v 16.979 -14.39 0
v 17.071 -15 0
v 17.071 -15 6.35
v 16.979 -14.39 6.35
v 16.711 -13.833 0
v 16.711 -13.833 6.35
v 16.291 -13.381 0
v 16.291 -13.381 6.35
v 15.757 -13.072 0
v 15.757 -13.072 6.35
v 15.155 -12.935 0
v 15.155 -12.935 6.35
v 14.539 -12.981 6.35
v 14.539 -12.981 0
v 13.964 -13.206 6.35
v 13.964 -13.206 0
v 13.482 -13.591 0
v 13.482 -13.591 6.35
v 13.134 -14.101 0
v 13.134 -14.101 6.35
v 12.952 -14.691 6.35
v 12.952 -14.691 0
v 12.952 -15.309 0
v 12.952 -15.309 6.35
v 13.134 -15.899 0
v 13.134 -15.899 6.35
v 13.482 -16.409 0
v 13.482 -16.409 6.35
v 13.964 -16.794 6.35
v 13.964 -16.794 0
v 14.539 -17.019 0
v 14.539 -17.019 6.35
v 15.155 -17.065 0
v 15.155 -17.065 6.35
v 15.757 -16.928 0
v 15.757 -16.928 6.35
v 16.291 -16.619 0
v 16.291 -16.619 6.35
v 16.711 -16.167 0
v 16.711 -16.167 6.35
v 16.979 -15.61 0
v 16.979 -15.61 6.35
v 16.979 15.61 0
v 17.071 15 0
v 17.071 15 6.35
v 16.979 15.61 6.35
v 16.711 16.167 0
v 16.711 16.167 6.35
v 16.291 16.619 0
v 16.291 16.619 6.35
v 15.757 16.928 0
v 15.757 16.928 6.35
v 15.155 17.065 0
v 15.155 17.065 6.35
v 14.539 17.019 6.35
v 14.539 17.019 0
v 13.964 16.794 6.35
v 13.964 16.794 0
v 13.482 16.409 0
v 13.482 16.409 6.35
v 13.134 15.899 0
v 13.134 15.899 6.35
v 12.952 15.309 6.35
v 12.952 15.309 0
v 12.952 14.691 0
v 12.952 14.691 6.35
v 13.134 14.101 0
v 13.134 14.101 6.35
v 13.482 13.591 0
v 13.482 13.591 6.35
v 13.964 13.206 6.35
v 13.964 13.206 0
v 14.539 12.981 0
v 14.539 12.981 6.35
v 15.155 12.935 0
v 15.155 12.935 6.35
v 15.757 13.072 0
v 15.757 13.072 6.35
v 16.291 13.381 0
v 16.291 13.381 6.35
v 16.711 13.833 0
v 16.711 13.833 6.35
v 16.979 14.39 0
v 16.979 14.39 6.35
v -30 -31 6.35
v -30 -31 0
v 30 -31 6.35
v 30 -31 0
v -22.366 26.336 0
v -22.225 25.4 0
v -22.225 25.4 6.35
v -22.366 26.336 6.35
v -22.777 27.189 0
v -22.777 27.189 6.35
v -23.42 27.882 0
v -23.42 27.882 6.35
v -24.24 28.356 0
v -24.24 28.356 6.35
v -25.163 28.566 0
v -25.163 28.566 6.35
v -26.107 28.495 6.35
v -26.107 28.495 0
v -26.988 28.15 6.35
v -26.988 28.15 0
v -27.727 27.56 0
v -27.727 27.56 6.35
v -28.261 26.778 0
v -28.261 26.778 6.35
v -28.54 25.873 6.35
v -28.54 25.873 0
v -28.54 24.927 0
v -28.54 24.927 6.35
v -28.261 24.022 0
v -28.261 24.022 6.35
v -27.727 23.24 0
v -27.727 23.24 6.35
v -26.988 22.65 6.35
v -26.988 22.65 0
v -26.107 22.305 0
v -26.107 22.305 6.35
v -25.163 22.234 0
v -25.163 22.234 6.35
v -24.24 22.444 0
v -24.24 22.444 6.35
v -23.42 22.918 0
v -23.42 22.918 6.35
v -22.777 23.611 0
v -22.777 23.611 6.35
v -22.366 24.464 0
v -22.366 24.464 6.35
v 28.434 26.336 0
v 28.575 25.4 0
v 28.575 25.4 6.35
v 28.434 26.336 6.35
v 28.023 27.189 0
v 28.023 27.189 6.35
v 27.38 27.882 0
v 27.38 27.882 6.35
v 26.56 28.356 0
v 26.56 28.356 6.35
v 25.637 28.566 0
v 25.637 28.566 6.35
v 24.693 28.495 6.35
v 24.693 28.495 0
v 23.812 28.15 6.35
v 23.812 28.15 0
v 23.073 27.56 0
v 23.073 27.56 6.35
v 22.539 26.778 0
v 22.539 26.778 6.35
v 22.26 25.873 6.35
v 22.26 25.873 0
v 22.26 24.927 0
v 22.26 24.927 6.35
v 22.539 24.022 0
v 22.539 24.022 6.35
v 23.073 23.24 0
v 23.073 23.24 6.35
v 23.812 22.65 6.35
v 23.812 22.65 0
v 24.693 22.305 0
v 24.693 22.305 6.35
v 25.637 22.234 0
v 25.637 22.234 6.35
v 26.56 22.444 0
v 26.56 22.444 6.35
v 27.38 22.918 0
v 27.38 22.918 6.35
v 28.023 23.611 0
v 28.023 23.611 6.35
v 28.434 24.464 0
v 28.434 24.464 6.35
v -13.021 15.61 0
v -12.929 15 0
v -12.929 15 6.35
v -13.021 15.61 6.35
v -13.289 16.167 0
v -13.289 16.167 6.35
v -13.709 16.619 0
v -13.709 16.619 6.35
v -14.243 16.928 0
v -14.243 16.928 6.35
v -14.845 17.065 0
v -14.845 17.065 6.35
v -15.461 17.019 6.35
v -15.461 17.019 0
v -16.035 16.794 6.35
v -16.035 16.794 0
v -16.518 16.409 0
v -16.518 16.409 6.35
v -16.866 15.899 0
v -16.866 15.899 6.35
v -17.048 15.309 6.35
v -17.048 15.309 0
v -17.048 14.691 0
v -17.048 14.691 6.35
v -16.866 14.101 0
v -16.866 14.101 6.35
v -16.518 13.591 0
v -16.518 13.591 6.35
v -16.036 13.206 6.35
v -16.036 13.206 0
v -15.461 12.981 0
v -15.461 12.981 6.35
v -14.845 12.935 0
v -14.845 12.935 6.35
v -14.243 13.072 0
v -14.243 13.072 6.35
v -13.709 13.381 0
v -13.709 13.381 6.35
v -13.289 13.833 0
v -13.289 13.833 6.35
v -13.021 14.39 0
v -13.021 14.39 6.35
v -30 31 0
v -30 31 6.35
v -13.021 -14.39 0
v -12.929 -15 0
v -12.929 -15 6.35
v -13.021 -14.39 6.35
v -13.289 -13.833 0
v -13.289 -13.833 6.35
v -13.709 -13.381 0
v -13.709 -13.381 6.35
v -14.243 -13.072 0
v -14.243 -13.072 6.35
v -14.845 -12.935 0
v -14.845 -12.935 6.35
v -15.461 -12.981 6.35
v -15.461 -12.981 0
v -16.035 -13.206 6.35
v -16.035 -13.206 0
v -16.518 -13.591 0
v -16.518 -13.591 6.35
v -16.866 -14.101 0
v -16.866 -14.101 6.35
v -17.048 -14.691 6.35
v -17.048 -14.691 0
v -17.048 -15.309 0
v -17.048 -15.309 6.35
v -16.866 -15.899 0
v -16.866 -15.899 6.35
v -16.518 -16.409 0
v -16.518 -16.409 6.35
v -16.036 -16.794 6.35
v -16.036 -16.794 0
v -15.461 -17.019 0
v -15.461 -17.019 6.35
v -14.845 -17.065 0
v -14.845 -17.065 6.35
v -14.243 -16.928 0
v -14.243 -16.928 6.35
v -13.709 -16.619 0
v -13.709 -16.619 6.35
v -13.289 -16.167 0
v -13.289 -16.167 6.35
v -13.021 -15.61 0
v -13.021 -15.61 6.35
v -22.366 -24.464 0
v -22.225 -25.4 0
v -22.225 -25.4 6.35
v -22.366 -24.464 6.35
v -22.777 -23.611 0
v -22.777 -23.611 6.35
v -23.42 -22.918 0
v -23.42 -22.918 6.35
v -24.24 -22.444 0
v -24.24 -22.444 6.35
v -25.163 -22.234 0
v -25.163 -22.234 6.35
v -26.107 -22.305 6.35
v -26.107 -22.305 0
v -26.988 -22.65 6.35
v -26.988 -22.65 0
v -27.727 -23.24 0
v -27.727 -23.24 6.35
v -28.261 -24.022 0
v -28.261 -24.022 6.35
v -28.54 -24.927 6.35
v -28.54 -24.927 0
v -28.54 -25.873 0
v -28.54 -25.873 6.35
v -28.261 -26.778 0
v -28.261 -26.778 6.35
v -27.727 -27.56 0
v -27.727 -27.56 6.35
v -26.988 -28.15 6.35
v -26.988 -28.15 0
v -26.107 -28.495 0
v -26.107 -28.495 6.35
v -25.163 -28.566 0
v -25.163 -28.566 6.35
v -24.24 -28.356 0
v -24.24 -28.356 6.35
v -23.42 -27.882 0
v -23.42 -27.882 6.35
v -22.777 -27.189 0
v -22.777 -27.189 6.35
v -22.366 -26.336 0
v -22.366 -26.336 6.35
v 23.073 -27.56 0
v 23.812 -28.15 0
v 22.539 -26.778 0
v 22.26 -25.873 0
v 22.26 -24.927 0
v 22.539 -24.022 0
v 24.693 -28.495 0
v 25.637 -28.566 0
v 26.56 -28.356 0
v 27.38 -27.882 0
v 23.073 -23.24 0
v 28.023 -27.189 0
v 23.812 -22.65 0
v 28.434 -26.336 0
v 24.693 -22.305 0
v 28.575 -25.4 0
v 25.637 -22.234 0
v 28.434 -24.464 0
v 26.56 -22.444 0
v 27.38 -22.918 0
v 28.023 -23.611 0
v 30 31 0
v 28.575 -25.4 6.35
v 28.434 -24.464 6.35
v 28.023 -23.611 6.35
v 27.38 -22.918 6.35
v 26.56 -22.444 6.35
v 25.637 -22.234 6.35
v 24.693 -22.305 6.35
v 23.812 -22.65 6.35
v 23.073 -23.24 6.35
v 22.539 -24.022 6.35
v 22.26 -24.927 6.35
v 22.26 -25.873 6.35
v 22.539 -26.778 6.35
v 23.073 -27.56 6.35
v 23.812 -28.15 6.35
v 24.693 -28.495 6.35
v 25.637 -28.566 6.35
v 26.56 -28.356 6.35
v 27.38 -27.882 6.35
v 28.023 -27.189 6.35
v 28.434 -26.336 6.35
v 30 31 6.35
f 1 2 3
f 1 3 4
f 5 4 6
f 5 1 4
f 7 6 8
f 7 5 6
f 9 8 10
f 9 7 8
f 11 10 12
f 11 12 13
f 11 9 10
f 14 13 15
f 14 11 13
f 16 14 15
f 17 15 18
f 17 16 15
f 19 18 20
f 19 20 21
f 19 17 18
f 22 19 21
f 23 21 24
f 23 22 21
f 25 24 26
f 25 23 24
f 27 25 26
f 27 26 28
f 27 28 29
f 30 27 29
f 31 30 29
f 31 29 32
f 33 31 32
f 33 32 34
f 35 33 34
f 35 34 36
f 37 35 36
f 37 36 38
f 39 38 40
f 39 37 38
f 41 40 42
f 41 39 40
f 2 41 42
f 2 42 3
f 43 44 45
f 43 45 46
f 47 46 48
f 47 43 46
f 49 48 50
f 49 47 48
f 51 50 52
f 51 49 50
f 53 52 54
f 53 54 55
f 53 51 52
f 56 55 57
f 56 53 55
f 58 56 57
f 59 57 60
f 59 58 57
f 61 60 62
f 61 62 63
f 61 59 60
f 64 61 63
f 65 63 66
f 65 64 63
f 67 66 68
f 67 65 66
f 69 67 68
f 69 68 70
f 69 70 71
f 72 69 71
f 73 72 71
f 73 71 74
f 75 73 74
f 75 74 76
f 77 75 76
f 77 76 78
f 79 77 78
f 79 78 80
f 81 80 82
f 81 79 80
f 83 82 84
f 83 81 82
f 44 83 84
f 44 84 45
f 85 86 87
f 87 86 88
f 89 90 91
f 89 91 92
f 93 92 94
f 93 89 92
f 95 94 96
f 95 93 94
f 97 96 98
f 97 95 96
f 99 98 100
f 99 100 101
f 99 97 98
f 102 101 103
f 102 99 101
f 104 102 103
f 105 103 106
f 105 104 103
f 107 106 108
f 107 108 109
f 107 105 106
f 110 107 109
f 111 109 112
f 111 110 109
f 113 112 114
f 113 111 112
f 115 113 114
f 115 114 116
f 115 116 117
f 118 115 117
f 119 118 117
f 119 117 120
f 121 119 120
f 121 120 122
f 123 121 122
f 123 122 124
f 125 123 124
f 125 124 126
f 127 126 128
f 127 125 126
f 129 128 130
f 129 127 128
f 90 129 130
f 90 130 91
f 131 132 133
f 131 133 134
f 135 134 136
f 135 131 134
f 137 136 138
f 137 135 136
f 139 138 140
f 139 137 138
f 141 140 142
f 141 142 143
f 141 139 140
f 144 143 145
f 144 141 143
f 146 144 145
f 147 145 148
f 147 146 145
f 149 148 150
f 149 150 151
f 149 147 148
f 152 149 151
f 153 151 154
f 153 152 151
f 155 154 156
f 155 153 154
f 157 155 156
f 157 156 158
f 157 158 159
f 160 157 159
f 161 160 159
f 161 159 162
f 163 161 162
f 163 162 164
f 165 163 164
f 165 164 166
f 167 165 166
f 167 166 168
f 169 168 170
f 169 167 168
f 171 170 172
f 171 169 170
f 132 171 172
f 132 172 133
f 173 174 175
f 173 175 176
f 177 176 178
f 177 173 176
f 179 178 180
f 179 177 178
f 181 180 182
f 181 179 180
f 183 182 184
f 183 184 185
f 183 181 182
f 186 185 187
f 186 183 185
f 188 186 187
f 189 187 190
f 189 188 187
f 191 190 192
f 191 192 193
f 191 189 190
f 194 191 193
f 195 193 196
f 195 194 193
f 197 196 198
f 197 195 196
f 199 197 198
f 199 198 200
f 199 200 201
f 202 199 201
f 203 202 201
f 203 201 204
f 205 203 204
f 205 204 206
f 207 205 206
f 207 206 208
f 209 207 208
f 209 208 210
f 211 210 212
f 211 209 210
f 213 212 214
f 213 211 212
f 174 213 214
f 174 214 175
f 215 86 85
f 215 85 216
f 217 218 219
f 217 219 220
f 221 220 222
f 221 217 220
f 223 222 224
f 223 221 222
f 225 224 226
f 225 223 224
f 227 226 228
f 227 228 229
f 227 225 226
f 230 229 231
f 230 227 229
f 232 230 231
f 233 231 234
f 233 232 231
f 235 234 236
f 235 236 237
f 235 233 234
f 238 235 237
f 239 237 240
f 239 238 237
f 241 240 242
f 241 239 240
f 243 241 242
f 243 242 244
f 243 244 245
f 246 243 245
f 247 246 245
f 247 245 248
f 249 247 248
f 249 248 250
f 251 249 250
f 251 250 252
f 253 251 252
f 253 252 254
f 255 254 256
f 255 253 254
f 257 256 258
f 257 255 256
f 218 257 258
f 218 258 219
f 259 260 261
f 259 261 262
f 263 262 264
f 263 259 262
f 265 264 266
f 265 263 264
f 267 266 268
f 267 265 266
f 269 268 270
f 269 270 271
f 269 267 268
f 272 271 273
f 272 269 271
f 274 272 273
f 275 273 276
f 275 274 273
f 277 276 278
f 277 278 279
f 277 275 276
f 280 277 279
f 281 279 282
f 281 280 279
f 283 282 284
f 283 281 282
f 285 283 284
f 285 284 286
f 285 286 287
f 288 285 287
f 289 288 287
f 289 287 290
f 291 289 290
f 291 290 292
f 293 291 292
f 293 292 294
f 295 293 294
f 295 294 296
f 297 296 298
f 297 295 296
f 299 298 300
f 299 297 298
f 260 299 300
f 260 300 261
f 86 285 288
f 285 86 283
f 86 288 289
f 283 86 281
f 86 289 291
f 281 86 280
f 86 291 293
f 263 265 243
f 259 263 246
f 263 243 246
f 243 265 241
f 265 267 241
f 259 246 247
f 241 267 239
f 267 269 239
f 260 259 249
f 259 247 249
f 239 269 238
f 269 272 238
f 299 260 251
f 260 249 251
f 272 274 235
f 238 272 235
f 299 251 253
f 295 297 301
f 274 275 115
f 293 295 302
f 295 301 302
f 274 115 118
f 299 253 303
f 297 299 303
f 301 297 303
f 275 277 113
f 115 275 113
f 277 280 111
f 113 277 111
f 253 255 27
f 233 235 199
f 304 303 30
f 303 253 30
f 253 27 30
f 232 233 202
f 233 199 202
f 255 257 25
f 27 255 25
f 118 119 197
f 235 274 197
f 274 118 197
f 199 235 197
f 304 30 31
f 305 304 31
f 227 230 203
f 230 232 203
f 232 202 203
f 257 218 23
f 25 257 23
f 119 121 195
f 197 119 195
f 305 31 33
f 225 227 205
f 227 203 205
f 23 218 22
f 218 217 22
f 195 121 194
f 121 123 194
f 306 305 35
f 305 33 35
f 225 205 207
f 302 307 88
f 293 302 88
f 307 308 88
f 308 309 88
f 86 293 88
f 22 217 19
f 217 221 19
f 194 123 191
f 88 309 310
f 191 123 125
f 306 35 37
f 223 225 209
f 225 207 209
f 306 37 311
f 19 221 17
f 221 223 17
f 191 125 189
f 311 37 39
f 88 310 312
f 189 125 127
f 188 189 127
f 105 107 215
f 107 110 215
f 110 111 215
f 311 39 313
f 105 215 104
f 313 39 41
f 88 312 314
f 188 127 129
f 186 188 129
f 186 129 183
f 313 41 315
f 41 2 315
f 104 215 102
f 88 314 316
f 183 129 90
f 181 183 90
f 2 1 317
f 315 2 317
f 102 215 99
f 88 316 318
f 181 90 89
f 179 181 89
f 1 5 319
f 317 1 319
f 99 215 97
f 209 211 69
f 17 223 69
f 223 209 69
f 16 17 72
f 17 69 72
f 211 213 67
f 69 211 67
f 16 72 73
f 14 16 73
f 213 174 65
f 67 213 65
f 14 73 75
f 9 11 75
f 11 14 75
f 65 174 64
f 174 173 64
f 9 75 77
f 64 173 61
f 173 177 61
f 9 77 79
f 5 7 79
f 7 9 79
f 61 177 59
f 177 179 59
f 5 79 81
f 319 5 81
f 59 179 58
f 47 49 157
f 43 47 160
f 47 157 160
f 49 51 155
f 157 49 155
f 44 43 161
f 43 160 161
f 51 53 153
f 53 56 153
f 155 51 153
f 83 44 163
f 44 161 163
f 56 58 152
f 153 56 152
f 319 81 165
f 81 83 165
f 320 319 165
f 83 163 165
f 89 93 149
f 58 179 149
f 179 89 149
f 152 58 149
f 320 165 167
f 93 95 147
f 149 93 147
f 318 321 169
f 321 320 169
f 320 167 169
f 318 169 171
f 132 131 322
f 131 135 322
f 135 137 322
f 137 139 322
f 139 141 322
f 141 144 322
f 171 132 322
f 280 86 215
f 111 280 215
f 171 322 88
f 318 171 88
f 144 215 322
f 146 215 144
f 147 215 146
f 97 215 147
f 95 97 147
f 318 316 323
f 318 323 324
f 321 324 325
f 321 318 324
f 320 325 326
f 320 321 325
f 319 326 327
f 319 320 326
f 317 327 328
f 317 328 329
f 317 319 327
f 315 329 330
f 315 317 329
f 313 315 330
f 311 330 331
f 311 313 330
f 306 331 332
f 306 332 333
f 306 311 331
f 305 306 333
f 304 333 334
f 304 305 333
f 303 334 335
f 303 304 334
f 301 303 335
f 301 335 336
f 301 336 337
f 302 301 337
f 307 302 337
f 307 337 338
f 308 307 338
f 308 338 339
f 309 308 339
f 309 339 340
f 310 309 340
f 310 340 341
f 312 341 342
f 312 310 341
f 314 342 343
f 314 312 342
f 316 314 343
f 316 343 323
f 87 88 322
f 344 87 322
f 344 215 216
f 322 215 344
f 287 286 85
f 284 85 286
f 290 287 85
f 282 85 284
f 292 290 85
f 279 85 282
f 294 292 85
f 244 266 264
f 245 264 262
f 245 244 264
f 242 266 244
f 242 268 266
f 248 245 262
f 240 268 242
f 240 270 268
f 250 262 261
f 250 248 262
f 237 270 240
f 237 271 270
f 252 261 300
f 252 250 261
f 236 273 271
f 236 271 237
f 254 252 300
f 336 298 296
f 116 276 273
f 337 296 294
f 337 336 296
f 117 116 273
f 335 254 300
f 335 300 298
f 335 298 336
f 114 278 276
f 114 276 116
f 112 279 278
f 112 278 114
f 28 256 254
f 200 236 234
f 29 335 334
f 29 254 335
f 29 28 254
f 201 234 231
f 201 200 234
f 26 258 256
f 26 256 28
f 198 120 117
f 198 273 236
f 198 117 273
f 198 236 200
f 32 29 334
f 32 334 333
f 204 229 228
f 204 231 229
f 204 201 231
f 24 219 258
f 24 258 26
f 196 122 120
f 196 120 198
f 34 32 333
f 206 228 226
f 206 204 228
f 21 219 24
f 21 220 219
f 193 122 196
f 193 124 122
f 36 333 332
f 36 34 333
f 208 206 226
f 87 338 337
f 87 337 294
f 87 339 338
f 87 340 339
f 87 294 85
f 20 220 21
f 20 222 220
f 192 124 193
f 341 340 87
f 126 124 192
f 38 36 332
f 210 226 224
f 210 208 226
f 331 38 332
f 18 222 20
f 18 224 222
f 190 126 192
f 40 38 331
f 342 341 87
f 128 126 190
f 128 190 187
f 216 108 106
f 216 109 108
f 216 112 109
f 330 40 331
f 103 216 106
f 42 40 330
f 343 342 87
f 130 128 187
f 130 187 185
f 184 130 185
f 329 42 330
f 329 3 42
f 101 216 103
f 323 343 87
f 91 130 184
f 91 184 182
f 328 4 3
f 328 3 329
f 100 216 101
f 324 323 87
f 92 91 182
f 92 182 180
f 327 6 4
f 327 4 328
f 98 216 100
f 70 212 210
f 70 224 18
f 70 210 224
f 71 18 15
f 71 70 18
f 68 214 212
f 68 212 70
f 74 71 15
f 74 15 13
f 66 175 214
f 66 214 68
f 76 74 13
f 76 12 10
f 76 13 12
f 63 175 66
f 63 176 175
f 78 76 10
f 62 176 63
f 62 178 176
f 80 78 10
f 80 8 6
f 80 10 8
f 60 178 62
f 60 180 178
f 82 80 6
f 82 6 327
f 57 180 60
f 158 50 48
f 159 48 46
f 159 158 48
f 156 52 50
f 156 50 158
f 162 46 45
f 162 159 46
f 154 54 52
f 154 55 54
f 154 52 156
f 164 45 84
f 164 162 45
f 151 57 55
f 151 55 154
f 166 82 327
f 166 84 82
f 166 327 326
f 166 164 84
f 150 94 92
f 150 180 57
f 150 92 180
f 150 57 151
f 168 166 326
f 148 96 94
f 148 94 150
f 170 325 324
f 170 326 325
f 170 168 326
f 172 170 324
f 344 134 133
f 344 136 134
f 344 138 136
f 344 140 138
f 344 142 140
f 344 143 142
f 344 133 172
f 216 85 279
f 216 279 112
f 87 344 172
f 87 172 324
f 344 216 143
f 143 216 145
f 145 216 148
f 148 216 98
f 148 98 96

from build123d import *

# Parameters (mm, degrees)
SKETCH1_W           = 60
SKETCH1_H           = 62
SKETCH1_R           = 3.175
SKETCH1_R_2         = 2.071
BOSS_EXTRUDE1_DEPTH = 6.35


with BuildPart() as part:
    # Sketch1 → Boss-Extrude1 (new body)
    with BuildSketch(Plane.XY):
        Rectangle(SKETCH1_W, SKETCH1_H)
        with Locations((25.4, 25.4)):
            Circle(SKETCH1_R, mode=Mode.SUBTRACT)
        with Locations((-25.4, 25.4)):
            Circle(SKETCH1_R, mode=Mode.SUBTRACT)
        with Locations((25.4, -25.4)):
            Circle(SKETCH1_R, mode=Mode.SUBTRACT)
        with Locations((-25.4, -25.4)):
            Circle(SKETCH1_R, mode=Mode.SUBTRACT)
        with Locations((-15, 15)):
            Circle(SKETCH1_R_2, mode=Mode.SUBTRACT)
        with Locations((-15, -15)):
            Circle(SKETCH1_R_2, mode=Mode.SUBTRACT)
        with Locations((15, -15)):
            Circle(SKETCH1_R_2, mode=Mode.SUBTRACT)
        with Locations((15, 15)):
            Circle(SKETCH1_R_2, mode=Mode.SUBTRACT)
    extrude(amount=BOSS_EXTRUDE1_DEPTH)


solid = part.part
